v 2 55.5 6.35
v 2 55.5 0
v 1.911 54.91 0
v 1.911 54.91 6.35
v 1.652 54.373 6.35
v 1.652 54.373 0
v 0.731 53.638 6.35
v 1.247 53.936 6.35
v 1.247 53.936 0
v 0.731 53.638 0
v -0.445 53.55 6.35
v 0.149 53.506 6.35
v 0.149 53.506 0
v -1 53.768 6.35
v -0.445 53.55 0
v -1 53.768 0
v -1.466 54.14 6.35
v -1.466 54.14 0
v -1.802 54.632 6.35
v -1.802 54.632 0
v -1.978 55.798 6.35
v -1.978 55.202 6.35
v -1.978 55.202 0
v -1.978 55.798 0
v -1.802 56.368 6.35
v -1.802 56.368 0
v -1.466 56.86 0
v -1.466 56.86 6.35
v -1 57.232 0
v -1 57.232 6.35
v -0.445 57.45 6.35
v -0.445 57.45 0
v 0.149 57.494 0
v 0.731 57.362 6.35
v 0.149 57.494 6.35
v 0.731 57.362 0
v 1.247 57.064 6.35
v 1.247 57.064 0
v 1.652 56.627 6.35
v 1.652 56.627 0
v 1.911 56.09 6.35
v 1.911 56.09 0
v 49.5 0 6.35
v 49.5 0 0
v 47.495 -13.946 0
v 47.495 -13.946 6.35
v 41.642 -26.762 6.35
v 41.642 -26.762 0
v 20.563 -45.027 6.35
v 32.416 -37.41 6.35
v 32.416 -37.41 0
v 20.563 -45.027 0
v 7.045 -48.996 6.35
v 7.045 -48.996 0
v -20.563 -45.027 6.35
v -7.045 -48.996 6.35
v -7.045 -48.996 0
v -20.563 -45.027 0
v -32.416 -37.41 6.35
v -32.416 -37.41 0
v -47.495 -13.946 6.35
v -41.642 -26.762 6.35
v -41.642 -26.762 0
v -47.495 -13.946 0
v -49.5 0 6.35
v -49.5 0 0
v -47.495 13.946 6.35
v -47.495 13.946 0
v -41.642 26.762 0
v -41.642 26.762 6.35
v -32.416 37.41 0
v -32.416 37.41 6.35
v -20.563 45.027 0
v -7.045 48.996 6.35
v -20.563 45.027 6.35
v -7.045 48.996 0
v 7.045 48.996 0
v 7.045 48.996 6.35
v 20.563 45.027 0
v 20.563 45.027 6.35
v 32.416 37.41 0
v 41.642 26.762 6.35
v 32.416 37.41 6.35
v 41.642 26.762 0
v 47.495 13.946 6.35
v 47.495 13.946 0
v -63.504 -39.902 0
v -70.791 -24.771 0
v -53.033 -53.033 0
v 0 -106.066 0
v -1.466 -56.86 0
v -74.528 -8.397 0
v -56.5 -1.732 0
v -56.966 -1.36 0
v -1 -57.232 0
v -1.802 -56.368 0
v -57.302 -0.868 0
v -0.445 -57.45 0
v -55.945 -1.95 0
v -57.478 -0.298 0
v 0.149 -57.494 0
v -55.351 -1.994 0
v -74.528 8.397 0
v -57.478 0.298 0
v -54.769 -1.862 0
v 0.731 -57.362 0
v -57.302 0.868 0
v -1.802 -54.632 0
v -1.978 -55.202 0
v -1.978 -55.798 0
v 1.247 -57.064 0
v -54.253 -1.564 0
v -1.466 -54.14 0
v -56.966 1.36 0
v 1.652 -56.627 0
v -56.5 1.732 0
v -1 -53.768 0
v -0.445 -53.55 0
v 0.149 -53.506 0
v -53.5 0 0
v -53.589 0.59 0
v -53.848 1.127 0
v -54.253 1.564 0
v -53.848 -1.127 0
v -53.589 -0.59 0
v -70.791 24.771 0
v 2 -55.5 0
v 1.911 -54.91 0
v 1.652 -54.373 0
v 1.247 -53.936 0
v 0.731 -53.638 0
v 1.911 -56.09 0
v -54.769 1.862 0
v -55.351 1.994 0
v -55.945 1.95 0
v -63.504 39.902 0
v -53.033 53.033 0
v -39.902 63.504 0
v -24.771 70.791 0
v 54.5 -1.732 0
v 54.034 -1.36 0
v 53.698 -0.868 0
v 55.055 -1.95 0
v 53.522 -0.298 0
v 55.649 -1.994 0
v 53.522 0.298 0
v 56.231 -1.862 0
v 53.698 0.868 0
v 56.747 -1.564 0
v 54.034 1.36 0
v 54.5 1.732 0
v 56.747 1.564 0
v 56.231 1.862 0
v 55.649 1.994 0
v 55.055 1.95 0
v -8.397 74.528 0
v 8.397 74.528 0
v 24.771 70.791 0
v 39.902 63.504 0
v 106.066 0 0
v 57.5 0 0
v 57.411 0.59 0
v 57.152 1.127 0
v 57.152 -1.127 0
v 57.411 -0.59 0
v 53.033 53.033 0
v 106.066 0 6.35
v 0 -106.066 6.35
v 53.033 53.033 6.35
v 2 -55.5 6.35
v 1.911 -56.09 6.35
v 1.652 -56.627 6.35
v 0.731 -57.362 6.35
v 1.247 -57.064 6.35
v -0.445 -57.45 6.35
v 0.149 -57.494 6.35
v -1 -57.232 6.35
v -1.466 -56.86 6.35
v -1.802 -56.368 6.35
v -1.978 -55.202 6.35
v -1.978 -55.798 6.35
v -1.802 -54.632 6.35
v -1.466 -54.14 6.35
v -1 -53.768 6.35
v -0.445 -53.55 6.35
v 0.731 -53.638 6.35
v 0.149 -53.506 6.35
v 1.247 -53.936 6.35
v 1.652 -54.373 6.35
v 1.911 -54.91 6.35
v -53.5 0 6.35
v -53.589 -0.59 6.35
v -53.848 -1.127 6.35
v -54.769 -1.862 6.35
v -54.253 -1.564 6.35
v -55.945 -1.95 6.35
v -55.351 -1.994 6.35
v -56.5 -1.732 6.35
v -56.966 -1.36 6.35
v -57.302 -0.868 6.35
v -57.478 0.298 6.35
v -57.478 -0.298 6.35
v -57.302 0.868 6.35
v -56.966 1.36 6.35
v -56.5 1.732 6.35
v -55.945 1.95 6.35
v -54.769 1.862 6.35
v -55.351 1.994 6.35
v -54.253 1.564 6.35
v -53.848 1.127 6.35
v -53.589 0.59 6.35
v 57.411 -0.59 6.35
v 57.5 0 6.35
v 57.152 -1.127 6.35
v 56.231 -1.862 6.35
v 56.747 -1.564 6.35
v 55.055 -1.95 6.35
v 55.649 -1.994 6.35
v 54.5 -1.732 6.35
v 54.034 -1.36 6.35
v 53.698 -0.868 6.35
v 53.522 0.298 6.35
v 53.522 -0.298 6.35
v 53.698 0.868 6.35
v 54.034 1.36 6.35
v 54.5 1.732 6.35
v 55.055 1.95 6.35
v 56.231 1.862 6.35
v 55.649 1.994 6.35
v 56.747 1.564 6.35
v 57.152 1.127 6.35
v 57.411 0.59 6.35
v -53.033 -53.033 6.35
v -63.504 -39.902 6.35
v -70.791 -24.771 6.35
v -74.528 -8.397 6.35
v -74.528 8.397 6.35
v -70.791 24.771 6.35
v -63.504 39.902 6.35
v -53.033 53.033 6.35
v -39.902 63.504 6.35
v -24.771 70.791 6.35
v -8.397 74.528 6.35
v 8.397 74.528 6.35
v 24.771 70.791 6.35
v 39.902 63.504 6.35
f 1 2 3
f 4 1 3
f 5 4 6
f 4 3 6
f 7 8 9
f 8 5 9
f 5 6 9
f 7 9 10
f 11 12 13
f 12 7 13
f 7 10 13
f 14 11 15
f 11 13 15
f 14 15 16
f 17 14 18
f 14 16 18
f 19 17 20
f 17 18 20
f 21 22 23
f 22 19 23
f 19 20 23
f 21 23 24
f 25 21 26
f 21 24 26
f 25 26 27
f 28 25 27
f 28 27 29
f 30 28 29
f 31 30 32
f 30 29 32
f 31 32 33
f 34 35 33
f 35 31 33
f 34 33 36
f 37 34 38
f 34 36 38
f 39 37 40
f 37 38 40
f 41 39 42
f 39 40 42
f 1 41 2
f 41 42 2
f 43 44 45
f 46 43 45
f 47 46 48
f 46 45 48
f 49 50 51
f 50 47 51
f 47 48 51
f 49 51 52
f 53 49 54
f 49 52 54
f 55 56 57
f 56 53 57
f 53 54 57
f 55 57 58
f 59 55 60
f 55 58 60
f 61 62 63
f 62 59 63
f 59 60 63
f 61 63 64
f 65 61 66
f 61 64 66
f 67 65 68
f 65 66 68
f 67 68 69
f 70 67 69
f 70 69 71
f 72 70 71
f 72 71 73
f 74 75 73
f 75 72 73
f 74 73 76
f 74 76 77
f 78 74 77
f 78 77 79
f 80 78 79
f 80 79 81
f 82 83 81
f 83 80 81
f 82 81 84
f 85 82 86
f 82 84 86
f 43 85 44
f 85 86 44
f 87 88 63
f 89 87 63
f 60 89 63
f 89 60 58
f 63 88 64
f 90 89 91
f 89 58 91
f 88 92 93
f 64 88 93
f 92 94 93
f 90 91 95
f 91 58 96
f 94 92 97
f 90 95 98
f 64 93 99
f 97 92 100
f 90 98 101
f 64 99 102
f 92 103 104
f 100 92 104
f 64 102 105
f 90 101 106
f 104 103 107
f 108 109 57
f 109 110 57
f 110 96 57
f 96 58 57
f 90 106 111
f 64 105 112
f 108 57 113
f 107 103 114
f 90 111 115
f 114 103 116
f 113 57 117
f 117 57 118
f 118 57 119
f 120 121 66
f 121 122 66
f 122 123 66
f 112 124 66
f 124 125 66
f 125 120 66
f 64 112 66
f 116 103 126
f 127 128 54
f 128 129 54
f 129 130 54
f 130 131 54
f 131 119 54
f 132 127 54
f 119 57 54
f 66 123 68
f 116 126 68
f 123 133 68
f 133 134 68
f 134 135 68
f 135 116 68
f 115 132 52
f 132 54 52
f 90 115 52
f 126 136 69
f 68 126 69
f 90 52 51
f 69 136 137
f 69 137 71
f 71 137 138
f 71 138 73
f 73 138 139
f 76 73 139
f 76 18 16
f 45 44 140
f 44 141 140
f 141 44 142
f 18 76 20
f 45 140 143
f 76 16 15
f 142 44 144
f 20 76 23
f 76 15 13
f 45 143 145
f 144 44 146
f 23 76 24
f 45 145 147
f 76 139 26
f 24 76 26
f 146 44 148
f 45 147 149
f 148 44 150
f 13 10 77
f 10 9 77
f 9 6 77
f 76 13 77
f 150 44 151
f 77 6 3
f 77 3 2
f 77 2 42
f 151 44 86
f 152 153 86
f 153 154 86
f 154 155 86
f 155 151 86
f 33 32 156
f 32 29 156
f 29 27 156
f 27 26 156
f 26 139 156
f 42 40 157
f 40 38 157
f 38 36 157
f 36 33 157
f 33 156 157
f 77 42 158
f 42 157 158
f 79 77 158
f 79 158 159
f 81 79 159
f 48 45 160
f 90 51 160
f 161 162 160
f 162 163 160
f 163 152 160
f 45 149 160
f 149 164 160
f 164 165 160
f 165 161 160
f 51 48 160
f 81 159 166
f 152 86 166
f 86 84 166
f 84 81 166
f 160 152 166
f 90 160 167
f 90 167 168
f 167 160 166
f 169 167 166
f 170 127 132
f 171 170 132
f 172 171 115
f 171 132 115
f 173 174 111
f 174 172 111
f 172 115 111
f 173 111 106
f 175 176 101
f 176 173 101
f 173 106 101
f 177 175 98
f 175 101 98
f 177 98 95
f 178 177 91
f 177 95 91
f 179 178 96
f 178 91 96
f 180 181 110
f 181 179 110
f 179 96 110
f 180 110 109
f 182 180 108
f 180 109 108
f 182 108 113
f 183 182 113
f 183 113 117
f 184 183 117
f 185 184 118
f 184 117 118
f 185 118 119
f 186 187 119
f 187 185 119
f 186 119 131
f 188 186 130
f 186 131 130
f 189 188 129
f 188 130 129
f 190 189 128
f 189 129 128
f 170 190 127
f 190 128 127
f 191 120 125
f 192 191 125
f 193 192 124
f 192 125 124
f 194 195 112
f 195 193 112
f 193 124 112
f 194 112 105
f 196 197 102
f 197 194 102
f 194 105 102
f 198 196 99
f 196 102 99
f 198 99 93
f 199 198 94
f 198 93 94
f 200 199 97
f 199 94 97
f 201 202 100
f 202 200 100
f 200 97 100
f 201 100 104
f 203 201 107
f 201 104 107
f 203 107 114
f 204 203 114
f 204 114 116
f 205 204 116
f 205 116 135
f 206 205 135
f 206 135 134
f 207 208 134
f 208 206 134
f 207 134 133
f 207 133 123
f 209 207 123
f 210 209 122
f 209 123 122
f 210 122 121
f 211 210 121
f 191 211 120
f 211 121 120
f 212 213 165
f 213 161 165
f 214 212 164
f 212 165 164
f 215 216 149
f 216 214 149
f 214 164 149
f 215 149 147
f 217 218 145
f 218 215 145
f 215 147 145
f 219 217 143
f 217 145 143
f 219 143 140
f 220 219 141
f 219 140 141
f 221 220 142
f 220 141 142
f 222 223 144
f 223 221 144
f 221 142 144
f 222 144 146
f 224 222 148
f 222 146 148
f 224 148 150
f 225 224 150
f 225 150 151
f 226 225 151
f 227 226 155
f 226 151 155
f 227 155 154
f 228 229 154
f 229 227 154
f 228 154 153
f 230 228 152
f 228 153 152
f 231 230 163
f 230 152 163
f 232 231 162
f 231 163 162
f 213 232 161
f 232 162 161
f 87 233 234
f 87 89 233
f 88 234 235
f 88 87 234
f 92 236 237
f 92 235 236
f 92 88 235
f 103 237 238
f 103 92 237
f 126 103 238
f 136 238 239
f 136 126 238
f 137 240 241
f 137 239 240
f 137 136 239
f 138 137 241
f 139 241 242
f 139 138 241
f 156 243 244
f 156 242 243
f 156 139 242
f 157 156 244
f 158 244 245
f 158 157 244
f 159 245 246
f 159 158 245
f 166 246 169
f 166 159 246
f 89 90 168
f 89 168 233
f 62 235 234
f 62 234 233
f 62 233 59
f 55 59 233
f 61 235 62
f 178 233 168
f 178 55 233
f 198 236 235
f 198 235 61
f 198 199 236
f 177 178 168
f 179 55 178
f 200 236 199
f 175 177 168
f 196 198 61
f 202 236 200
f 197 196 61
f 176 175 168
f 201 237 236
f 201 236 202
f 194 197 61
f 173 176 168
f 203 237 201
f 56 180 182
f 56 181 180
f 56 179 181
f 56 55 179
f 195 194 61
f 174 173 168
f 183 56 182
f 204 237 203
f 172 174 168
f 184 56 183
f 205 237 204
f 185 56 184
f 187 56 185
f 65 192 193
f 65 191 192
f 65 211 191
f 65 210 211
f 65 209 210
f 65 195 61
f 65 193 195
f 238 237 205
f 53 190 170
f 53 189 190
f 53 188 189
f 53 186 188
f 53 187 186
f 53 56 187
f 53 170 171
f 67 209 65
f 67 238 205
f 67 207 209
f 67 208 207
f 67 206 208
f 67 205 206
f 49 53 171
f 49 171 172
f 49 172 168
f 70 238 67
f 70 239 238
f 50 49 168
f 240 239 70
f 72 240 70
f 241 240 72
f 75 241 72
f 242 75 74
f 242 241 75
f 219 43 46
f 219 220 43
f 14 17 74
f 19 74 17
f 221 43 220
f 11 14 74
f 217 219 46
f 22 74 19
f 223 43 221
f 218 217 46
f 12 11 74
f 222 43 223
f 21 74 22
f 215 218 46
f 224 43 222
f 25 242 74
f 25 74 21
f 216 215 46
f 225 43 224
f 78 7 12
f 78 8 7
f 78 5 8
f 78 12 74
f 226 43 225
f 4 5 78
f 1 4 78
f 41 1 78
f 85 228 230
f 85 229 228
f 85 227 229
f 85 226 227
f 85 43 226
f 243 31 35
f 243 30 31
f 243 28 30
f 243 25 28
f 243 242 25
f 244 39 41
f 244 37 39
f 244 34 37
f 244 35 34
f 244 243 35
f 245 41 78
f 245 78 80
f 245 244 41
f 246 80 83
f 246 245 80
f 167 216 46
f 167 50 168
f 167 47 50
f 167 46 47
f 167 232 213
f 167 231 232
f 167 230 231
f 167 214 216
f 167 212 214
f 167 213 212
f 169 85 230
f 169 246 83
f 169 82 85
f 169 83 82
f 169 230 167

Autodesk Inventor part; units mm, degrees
ref_plane "YZ Plane" through (0, 0, 0) normal (1, 0, 0) x (0, 1, 0)
ref_plane "XZ Plane" through (0, 0, 0) normal (0, 1, 0) x (-1, 0, 0)
ref_plane "XY Plane" through (0, 0, 0) normal (0, 0, 1) x (1, 0, 0)
ref_plane "Work Plane1" through (0, 0, 0) normal (0, 0, 1) x (1, 0, 0)
sketch "Sketch1" plane through (0, 0, 0) normal (0, 0, 1) x (1, 0, 0)
  circle A0 centre (0, 55.5) radius 2 projected
  circle A1 centre (55.5, 0) radius 2 projected
  circle A2 centre (-55.5, 0) radius 2 projected
  circle A3 centre (0, -55.5) radius 2 projected
  circle A4 centre (-39.2444, -39.2444) radius 4 projected
  circle A5 centre (39.2444, -39.2444) radius 4 projected
  circle A6 centre (-39.2444, 39.2444) radius 4 projected
  circle A7 centre (39.2444, 39.2444) radius 4 projected
  circle A8 centre (0, 0) radius 61.5 projected
  circle A9 centre (0, 0) radius 49.5 projected
  circle A10 centre (0, 0) radius 75
  line L0 (106.066, 0) -> (0, -106.066)
  line L1 (0, -55.5) -> (-55.5, 0) construction
  line L2 (106.066, 0) -> (53.033, 53.033)
  line L3 (0, -106.066) -> (-53.033, -53.033)
  point P0 (0, 0)
  dimension "d0" = 150
extrude "Extrusion1" add sketch "Sketch1" along normal blind 6.35 contours A4 | A5 | A6 | A7 | A8 | A10 | A10 L2 L0 | L0 L3 A10
properties part number "AxisBoard"
